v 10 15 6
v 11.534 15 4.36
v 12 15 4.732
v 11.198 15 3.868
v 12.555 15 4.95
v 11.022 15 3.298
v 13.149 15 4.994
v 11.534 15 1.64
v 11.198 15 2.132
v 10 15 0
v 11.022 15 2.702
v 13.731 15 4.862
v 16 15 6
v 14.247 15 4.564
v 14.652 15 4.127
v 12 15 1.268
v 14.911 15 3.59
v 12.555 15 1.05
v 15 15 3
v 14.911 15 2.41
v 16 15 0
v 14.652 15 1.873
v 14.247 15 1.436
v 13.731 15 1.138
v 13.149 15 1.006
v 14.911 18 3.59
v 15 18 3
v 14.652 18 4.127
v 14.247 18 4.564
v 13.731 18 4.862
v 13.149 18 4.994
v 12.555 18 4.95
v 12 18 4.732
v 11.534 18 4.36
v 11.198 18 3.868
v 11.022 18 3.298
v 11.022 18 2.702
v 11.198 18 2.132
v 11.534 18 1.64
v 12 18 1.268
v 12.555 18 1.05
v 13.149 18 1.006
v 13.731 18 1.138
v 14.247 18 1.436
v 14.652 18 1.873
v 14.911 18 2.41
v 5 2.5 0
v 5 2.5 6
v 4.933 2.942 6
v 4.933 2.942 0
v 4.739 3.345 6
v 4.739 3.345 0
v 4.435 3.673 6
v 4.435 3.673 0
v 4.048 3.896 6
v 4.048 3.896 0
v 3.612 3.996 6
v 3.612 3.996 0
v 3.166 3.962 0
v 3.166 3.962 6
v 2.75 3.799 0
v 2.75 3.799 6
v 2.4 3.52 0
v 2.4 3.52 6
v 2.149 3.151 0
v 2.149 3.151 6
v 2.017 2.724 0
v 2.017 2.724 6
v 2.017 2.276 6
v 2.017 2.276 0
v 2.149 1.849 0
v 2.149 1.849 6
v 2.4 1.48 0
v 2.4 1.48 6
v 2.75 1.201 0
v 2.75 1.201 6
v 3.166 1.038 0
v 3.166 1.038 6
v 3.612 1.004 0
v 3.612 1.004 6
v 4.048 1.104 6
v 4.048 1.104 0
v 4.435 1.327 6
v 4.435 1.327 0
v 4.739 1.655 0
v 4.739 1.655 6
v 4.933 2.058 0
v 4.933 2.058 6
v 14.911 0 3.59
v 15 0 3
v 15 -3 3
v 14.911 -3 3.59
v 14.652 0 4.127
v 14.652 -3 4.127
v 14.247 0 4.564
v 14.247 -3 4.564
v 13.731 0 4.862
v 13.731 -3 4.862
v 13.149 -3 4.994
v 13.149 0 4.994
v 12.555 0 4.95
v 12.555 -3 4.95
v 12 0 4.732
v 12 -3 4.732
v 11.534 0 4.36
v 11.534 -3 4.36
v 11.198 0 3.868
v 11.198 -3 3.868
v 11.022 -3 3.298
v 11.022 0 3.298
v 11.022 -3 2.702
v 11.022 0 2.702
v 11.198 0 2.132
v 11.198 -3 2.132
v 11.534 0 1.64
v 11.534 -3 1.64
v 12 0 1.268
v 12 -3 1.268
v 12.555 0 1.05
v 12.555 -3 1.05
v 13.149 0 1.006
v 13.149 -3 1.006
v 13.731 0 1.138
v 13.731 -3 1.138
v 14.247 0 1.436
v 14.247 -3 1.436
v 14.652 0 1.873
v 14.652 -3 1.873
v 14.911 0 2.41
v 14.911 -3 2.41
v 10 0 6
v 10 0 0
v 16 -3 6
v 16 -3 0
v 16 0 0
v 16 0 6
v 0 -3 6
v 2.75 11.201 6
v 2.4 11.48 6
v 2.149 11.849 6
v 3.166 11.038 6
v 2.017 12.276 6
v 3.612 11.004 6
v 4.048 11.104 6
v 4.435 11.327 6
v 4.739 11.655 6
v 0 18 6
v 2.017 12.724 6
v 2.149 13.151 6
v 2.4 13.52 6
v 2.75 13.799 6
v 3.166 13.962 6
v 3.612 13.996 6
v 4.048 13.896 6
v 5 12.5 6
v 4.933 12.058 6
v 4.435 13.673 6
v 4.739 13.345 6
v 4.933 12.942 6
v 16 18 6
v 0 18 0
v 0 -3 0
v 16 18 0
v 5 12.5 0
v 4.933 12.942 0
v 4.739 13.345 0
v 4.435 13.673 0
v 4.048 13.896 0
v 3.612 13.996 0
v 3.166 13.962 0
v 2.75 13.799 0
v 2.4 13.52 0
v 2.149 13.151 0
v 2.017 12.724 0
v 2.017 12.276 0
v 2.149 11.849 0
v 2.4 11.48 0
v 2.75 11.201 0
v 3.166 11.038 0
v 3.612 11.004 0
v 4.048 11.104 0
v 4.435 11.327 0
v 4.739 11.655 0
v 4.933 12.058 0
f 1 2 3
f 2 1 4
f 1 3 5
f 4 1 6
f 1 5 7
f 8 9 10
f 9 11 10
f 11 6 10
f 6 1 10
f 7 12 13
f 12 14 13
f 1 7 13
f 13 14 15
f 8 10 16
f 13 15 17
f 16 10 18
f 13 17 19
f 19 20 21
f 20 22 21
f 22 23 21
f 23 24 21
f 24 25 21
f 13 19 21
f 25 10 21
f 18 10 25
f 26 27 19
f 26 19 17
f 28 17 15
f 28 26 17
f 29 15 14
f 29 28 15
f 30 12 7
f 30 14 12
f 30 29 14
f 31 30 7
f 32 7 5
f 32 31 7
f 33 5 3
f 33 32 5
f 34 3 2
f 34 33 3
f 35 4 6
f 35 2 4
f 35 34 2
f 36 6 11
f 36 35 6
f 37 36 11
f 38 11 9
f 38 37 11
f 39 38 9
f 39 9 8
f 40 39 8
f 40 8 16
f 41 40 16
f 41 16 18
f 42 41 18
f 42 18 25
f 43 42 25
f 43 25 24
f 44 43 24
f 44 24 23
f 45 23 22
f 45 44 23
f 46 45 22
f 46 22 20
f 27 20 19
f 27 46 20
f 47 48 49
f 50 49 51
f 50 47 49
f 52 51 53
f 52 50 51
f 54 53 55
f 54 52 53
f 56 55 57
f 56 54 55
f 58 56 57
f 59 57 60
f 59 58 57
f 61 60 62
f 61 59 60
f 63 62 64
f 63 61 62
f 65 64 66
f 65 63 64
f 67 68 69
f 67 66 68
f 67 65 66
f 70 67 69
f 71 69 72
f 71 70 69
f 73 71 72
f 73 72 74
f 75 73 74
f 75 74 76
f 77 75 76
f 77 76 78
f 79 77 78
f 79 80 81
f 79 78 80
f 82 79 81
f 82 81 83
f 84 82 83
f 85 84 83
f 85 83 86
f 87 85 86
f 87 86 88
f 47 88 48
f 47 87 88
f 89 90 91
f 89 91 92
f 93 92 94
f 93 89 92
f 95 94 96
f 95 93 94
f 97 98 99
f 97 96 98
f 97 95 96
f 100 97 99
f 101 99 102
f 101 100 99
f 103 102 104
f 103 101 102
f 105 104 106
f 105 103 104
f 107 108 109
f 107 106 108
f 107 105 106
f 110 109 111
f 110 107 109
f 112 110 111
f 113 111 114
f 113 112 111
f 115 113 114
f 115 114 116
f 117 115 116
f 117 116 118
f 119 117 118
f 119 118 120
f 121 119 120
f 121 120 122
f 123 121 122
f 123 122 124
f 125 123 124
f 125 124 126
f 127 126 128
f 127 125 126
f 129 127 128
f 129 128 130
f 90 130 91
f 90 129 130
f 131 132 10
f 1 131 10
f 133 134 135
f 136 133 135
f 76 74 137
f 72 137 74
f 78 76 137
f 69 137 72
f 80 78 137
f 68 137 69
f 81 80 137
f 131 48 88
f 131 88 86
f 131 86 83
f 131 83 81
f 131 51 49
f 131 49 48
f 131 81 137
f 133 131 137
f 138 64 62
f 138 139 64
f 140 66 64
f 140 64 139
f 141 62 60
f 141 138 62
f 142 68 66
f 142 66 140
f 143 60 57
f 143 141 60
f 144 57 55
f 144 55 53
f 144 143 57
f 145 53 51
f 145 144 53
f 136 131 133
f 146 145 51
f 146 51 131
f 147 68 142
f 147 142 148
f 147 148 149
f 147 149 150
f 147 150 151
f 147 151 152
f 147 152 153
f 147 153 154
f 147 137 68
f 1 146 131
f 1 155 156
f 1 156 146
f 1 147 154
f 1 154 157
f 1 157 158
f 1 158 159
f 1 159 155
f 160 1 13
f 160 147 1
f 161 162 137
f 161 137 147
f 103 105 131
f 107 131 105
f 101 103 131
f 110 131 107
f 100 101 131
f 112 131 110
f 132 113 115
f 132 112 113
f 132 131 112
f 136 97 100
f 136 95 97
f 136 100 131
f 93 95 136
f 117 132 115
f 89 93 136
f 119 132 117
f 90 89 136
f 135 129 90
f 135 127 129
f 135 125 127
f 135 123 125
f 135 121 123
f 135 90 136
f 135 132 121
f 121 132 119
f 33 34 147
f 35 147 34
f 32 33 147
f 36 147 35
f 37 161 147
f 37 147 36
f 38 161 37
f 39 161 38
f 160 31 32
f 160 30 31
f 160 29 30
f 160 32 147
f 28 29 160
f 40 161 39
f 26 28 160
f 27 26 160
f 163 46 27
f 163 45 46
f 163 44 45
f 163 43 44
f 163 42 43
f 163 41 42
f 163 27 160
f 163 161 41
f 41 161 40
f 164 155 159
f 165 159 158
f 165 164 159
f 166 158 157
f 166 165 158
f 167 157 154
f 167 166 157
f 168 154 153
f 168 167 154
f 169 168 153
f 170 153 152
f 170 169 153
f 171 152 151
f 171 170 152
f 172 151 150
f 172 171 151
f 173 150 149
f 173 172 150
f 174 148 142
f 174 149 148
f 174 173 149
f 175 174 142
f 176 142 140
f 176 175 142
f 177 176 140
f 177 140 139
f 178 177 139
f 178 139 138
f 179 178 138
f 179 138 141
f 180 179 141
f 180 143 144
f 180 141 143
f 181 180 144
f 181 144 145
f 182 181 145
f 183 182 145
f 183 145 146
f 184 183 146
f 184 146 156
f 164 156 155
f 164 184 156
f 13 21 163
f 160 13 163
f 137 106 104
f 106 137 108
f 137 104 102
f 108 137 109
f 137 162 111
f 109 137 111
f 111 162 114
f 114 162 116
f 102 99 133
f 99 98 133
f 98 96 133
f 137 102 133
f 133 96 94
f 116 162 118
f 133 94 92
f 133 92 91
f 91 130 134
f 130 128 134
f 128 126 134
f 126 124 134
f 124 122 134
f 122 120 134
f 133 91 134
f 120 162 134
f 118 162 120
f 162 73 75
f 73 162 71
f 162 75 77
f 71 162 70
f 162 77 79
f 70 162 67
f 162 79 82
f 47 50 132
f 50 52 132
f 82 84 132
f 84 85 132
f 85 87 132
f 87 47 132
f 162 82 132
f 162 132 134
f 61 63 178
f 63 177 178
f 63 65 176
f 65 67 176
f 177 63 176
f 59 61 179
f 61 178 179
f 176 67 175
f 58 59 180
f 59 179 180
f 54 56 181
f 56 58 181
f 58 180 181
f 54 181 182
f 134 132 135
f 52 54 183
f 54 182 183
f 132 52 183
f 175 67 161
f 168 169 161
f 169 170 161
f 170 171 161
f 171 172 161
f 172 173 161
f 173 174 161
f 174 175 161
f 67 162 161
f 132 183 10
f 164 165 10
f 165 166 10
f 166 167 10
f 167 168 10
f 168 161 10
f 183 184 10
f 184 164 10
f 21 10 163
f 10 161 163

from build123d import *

# Parameters (mm, degrees)
CYLINDER001_R          = 1.5
CYLINDER001_DEPTH      = 10
CYLINDER_R             = 1.5
CYLINDER_DEPTH         = 10
CYLINDER002_R          = 2
CYLINDER002_DEPTH      = 30
CYLINDER002_ROLL_ANGLE = 90
BOX_W                  = 10
BOX_H                  = 15
BOX_DEPTH              = 6
BOX002_W               = 16
BOX002_H               = 3
BOX002_DEPTH           = 6
BOX001_W               = 16
BOX001_H               = 3
BOX001_DEPTH           = 6


with BuildPart() as cylinder001:
    # Cylinder001 → Cylinder001 (new body)
    with BuildSketch(Plane(origin=(3.5, 12.5, 0), x_dir=(1, 0, 0), z_dir=(0, 0, 1))):
        Circle(CYLINDER001_R)
    extrude(amount=CYLINDER001_DEPTH)


with BuildPart() as cylinder:
    # Cylinder → Cylinder (new body)
    with BuildSketch(Plane(origin=(3.5, 2.5, 0), x_dir=(1, 0, 0), z_dir=(0, 0, 1))):
        Circle(CYLINDER_R)
    extrude(amount=CYLINDER_DEPTH)


with BuildPart() as cylinder002:
    # Cylinder002 → Cylinder002 (new body)
    with BuildSketch(Plane.XY):
        Circle(CYLINDER002_R)
    extrude(amount=CYLINDER002_DEPTH)


with BuildPart() as cylinder002_1:
    # Cylinder002 roll: moved
    add(cylinder002.part.rotate(Axis((0, 0, 0), (1, 0, 0)), CYLINDER002_ROLL_ANGLE))


with BuildPart() as cylinder002_2:
    # Cylinder002 placement: moved
    add(cylinder002_1.part.moved(Location((13, 20, 3))))


with BuildPart() as cube:
    # Box → Box (new body)
    with BuildSketch(Plane.XY):
        with Locations((5, 7.5)):
            Rectangle(BOX_W, BOX_H)
    extrude(amount=BOX_DEPTH)


with BuildPart() as cube002:
    # Box002 → Box002 (new body)
    with BuildSketch(Plane(origin=(0, 15, 0), x_dir=(1, 0, 0), z_dir=(0, 0, 1))):
        with Locations((8, 1.5)):
            Rectangle(BOX002_W, BOX002_H)
    extrude(amount=BOX002_DEPTH)


with BuildPart() as cut002:
    # Box001 → Box001 (new body)
    with BuildSketch(Plane(origin=(0, -3, 0), x_dir=(1, 0, 0), z_dir=(0, 0, 1))):
        with Locations((8, 1.5)):
            Rectangle(BOX001_W, BOX001_H)
    extrude(amount=BOX001_DEPTH)

    # Fusion: union Cube, Cube002
    add(cube.part)
    add(cube002.part)

    # Cut: cut Cylinder002
    add(cylinder002_2.part, mode=Mode.SUBTRACT)

    # Cut001: cut Cylinder
    add(cylinder.part, mode=Mode.SUBTRACT)

    # Cut002: cut Cylinder001
    add(cylinder001.part, mode=Mode.SUBTRACT)


solid = cut002.part
